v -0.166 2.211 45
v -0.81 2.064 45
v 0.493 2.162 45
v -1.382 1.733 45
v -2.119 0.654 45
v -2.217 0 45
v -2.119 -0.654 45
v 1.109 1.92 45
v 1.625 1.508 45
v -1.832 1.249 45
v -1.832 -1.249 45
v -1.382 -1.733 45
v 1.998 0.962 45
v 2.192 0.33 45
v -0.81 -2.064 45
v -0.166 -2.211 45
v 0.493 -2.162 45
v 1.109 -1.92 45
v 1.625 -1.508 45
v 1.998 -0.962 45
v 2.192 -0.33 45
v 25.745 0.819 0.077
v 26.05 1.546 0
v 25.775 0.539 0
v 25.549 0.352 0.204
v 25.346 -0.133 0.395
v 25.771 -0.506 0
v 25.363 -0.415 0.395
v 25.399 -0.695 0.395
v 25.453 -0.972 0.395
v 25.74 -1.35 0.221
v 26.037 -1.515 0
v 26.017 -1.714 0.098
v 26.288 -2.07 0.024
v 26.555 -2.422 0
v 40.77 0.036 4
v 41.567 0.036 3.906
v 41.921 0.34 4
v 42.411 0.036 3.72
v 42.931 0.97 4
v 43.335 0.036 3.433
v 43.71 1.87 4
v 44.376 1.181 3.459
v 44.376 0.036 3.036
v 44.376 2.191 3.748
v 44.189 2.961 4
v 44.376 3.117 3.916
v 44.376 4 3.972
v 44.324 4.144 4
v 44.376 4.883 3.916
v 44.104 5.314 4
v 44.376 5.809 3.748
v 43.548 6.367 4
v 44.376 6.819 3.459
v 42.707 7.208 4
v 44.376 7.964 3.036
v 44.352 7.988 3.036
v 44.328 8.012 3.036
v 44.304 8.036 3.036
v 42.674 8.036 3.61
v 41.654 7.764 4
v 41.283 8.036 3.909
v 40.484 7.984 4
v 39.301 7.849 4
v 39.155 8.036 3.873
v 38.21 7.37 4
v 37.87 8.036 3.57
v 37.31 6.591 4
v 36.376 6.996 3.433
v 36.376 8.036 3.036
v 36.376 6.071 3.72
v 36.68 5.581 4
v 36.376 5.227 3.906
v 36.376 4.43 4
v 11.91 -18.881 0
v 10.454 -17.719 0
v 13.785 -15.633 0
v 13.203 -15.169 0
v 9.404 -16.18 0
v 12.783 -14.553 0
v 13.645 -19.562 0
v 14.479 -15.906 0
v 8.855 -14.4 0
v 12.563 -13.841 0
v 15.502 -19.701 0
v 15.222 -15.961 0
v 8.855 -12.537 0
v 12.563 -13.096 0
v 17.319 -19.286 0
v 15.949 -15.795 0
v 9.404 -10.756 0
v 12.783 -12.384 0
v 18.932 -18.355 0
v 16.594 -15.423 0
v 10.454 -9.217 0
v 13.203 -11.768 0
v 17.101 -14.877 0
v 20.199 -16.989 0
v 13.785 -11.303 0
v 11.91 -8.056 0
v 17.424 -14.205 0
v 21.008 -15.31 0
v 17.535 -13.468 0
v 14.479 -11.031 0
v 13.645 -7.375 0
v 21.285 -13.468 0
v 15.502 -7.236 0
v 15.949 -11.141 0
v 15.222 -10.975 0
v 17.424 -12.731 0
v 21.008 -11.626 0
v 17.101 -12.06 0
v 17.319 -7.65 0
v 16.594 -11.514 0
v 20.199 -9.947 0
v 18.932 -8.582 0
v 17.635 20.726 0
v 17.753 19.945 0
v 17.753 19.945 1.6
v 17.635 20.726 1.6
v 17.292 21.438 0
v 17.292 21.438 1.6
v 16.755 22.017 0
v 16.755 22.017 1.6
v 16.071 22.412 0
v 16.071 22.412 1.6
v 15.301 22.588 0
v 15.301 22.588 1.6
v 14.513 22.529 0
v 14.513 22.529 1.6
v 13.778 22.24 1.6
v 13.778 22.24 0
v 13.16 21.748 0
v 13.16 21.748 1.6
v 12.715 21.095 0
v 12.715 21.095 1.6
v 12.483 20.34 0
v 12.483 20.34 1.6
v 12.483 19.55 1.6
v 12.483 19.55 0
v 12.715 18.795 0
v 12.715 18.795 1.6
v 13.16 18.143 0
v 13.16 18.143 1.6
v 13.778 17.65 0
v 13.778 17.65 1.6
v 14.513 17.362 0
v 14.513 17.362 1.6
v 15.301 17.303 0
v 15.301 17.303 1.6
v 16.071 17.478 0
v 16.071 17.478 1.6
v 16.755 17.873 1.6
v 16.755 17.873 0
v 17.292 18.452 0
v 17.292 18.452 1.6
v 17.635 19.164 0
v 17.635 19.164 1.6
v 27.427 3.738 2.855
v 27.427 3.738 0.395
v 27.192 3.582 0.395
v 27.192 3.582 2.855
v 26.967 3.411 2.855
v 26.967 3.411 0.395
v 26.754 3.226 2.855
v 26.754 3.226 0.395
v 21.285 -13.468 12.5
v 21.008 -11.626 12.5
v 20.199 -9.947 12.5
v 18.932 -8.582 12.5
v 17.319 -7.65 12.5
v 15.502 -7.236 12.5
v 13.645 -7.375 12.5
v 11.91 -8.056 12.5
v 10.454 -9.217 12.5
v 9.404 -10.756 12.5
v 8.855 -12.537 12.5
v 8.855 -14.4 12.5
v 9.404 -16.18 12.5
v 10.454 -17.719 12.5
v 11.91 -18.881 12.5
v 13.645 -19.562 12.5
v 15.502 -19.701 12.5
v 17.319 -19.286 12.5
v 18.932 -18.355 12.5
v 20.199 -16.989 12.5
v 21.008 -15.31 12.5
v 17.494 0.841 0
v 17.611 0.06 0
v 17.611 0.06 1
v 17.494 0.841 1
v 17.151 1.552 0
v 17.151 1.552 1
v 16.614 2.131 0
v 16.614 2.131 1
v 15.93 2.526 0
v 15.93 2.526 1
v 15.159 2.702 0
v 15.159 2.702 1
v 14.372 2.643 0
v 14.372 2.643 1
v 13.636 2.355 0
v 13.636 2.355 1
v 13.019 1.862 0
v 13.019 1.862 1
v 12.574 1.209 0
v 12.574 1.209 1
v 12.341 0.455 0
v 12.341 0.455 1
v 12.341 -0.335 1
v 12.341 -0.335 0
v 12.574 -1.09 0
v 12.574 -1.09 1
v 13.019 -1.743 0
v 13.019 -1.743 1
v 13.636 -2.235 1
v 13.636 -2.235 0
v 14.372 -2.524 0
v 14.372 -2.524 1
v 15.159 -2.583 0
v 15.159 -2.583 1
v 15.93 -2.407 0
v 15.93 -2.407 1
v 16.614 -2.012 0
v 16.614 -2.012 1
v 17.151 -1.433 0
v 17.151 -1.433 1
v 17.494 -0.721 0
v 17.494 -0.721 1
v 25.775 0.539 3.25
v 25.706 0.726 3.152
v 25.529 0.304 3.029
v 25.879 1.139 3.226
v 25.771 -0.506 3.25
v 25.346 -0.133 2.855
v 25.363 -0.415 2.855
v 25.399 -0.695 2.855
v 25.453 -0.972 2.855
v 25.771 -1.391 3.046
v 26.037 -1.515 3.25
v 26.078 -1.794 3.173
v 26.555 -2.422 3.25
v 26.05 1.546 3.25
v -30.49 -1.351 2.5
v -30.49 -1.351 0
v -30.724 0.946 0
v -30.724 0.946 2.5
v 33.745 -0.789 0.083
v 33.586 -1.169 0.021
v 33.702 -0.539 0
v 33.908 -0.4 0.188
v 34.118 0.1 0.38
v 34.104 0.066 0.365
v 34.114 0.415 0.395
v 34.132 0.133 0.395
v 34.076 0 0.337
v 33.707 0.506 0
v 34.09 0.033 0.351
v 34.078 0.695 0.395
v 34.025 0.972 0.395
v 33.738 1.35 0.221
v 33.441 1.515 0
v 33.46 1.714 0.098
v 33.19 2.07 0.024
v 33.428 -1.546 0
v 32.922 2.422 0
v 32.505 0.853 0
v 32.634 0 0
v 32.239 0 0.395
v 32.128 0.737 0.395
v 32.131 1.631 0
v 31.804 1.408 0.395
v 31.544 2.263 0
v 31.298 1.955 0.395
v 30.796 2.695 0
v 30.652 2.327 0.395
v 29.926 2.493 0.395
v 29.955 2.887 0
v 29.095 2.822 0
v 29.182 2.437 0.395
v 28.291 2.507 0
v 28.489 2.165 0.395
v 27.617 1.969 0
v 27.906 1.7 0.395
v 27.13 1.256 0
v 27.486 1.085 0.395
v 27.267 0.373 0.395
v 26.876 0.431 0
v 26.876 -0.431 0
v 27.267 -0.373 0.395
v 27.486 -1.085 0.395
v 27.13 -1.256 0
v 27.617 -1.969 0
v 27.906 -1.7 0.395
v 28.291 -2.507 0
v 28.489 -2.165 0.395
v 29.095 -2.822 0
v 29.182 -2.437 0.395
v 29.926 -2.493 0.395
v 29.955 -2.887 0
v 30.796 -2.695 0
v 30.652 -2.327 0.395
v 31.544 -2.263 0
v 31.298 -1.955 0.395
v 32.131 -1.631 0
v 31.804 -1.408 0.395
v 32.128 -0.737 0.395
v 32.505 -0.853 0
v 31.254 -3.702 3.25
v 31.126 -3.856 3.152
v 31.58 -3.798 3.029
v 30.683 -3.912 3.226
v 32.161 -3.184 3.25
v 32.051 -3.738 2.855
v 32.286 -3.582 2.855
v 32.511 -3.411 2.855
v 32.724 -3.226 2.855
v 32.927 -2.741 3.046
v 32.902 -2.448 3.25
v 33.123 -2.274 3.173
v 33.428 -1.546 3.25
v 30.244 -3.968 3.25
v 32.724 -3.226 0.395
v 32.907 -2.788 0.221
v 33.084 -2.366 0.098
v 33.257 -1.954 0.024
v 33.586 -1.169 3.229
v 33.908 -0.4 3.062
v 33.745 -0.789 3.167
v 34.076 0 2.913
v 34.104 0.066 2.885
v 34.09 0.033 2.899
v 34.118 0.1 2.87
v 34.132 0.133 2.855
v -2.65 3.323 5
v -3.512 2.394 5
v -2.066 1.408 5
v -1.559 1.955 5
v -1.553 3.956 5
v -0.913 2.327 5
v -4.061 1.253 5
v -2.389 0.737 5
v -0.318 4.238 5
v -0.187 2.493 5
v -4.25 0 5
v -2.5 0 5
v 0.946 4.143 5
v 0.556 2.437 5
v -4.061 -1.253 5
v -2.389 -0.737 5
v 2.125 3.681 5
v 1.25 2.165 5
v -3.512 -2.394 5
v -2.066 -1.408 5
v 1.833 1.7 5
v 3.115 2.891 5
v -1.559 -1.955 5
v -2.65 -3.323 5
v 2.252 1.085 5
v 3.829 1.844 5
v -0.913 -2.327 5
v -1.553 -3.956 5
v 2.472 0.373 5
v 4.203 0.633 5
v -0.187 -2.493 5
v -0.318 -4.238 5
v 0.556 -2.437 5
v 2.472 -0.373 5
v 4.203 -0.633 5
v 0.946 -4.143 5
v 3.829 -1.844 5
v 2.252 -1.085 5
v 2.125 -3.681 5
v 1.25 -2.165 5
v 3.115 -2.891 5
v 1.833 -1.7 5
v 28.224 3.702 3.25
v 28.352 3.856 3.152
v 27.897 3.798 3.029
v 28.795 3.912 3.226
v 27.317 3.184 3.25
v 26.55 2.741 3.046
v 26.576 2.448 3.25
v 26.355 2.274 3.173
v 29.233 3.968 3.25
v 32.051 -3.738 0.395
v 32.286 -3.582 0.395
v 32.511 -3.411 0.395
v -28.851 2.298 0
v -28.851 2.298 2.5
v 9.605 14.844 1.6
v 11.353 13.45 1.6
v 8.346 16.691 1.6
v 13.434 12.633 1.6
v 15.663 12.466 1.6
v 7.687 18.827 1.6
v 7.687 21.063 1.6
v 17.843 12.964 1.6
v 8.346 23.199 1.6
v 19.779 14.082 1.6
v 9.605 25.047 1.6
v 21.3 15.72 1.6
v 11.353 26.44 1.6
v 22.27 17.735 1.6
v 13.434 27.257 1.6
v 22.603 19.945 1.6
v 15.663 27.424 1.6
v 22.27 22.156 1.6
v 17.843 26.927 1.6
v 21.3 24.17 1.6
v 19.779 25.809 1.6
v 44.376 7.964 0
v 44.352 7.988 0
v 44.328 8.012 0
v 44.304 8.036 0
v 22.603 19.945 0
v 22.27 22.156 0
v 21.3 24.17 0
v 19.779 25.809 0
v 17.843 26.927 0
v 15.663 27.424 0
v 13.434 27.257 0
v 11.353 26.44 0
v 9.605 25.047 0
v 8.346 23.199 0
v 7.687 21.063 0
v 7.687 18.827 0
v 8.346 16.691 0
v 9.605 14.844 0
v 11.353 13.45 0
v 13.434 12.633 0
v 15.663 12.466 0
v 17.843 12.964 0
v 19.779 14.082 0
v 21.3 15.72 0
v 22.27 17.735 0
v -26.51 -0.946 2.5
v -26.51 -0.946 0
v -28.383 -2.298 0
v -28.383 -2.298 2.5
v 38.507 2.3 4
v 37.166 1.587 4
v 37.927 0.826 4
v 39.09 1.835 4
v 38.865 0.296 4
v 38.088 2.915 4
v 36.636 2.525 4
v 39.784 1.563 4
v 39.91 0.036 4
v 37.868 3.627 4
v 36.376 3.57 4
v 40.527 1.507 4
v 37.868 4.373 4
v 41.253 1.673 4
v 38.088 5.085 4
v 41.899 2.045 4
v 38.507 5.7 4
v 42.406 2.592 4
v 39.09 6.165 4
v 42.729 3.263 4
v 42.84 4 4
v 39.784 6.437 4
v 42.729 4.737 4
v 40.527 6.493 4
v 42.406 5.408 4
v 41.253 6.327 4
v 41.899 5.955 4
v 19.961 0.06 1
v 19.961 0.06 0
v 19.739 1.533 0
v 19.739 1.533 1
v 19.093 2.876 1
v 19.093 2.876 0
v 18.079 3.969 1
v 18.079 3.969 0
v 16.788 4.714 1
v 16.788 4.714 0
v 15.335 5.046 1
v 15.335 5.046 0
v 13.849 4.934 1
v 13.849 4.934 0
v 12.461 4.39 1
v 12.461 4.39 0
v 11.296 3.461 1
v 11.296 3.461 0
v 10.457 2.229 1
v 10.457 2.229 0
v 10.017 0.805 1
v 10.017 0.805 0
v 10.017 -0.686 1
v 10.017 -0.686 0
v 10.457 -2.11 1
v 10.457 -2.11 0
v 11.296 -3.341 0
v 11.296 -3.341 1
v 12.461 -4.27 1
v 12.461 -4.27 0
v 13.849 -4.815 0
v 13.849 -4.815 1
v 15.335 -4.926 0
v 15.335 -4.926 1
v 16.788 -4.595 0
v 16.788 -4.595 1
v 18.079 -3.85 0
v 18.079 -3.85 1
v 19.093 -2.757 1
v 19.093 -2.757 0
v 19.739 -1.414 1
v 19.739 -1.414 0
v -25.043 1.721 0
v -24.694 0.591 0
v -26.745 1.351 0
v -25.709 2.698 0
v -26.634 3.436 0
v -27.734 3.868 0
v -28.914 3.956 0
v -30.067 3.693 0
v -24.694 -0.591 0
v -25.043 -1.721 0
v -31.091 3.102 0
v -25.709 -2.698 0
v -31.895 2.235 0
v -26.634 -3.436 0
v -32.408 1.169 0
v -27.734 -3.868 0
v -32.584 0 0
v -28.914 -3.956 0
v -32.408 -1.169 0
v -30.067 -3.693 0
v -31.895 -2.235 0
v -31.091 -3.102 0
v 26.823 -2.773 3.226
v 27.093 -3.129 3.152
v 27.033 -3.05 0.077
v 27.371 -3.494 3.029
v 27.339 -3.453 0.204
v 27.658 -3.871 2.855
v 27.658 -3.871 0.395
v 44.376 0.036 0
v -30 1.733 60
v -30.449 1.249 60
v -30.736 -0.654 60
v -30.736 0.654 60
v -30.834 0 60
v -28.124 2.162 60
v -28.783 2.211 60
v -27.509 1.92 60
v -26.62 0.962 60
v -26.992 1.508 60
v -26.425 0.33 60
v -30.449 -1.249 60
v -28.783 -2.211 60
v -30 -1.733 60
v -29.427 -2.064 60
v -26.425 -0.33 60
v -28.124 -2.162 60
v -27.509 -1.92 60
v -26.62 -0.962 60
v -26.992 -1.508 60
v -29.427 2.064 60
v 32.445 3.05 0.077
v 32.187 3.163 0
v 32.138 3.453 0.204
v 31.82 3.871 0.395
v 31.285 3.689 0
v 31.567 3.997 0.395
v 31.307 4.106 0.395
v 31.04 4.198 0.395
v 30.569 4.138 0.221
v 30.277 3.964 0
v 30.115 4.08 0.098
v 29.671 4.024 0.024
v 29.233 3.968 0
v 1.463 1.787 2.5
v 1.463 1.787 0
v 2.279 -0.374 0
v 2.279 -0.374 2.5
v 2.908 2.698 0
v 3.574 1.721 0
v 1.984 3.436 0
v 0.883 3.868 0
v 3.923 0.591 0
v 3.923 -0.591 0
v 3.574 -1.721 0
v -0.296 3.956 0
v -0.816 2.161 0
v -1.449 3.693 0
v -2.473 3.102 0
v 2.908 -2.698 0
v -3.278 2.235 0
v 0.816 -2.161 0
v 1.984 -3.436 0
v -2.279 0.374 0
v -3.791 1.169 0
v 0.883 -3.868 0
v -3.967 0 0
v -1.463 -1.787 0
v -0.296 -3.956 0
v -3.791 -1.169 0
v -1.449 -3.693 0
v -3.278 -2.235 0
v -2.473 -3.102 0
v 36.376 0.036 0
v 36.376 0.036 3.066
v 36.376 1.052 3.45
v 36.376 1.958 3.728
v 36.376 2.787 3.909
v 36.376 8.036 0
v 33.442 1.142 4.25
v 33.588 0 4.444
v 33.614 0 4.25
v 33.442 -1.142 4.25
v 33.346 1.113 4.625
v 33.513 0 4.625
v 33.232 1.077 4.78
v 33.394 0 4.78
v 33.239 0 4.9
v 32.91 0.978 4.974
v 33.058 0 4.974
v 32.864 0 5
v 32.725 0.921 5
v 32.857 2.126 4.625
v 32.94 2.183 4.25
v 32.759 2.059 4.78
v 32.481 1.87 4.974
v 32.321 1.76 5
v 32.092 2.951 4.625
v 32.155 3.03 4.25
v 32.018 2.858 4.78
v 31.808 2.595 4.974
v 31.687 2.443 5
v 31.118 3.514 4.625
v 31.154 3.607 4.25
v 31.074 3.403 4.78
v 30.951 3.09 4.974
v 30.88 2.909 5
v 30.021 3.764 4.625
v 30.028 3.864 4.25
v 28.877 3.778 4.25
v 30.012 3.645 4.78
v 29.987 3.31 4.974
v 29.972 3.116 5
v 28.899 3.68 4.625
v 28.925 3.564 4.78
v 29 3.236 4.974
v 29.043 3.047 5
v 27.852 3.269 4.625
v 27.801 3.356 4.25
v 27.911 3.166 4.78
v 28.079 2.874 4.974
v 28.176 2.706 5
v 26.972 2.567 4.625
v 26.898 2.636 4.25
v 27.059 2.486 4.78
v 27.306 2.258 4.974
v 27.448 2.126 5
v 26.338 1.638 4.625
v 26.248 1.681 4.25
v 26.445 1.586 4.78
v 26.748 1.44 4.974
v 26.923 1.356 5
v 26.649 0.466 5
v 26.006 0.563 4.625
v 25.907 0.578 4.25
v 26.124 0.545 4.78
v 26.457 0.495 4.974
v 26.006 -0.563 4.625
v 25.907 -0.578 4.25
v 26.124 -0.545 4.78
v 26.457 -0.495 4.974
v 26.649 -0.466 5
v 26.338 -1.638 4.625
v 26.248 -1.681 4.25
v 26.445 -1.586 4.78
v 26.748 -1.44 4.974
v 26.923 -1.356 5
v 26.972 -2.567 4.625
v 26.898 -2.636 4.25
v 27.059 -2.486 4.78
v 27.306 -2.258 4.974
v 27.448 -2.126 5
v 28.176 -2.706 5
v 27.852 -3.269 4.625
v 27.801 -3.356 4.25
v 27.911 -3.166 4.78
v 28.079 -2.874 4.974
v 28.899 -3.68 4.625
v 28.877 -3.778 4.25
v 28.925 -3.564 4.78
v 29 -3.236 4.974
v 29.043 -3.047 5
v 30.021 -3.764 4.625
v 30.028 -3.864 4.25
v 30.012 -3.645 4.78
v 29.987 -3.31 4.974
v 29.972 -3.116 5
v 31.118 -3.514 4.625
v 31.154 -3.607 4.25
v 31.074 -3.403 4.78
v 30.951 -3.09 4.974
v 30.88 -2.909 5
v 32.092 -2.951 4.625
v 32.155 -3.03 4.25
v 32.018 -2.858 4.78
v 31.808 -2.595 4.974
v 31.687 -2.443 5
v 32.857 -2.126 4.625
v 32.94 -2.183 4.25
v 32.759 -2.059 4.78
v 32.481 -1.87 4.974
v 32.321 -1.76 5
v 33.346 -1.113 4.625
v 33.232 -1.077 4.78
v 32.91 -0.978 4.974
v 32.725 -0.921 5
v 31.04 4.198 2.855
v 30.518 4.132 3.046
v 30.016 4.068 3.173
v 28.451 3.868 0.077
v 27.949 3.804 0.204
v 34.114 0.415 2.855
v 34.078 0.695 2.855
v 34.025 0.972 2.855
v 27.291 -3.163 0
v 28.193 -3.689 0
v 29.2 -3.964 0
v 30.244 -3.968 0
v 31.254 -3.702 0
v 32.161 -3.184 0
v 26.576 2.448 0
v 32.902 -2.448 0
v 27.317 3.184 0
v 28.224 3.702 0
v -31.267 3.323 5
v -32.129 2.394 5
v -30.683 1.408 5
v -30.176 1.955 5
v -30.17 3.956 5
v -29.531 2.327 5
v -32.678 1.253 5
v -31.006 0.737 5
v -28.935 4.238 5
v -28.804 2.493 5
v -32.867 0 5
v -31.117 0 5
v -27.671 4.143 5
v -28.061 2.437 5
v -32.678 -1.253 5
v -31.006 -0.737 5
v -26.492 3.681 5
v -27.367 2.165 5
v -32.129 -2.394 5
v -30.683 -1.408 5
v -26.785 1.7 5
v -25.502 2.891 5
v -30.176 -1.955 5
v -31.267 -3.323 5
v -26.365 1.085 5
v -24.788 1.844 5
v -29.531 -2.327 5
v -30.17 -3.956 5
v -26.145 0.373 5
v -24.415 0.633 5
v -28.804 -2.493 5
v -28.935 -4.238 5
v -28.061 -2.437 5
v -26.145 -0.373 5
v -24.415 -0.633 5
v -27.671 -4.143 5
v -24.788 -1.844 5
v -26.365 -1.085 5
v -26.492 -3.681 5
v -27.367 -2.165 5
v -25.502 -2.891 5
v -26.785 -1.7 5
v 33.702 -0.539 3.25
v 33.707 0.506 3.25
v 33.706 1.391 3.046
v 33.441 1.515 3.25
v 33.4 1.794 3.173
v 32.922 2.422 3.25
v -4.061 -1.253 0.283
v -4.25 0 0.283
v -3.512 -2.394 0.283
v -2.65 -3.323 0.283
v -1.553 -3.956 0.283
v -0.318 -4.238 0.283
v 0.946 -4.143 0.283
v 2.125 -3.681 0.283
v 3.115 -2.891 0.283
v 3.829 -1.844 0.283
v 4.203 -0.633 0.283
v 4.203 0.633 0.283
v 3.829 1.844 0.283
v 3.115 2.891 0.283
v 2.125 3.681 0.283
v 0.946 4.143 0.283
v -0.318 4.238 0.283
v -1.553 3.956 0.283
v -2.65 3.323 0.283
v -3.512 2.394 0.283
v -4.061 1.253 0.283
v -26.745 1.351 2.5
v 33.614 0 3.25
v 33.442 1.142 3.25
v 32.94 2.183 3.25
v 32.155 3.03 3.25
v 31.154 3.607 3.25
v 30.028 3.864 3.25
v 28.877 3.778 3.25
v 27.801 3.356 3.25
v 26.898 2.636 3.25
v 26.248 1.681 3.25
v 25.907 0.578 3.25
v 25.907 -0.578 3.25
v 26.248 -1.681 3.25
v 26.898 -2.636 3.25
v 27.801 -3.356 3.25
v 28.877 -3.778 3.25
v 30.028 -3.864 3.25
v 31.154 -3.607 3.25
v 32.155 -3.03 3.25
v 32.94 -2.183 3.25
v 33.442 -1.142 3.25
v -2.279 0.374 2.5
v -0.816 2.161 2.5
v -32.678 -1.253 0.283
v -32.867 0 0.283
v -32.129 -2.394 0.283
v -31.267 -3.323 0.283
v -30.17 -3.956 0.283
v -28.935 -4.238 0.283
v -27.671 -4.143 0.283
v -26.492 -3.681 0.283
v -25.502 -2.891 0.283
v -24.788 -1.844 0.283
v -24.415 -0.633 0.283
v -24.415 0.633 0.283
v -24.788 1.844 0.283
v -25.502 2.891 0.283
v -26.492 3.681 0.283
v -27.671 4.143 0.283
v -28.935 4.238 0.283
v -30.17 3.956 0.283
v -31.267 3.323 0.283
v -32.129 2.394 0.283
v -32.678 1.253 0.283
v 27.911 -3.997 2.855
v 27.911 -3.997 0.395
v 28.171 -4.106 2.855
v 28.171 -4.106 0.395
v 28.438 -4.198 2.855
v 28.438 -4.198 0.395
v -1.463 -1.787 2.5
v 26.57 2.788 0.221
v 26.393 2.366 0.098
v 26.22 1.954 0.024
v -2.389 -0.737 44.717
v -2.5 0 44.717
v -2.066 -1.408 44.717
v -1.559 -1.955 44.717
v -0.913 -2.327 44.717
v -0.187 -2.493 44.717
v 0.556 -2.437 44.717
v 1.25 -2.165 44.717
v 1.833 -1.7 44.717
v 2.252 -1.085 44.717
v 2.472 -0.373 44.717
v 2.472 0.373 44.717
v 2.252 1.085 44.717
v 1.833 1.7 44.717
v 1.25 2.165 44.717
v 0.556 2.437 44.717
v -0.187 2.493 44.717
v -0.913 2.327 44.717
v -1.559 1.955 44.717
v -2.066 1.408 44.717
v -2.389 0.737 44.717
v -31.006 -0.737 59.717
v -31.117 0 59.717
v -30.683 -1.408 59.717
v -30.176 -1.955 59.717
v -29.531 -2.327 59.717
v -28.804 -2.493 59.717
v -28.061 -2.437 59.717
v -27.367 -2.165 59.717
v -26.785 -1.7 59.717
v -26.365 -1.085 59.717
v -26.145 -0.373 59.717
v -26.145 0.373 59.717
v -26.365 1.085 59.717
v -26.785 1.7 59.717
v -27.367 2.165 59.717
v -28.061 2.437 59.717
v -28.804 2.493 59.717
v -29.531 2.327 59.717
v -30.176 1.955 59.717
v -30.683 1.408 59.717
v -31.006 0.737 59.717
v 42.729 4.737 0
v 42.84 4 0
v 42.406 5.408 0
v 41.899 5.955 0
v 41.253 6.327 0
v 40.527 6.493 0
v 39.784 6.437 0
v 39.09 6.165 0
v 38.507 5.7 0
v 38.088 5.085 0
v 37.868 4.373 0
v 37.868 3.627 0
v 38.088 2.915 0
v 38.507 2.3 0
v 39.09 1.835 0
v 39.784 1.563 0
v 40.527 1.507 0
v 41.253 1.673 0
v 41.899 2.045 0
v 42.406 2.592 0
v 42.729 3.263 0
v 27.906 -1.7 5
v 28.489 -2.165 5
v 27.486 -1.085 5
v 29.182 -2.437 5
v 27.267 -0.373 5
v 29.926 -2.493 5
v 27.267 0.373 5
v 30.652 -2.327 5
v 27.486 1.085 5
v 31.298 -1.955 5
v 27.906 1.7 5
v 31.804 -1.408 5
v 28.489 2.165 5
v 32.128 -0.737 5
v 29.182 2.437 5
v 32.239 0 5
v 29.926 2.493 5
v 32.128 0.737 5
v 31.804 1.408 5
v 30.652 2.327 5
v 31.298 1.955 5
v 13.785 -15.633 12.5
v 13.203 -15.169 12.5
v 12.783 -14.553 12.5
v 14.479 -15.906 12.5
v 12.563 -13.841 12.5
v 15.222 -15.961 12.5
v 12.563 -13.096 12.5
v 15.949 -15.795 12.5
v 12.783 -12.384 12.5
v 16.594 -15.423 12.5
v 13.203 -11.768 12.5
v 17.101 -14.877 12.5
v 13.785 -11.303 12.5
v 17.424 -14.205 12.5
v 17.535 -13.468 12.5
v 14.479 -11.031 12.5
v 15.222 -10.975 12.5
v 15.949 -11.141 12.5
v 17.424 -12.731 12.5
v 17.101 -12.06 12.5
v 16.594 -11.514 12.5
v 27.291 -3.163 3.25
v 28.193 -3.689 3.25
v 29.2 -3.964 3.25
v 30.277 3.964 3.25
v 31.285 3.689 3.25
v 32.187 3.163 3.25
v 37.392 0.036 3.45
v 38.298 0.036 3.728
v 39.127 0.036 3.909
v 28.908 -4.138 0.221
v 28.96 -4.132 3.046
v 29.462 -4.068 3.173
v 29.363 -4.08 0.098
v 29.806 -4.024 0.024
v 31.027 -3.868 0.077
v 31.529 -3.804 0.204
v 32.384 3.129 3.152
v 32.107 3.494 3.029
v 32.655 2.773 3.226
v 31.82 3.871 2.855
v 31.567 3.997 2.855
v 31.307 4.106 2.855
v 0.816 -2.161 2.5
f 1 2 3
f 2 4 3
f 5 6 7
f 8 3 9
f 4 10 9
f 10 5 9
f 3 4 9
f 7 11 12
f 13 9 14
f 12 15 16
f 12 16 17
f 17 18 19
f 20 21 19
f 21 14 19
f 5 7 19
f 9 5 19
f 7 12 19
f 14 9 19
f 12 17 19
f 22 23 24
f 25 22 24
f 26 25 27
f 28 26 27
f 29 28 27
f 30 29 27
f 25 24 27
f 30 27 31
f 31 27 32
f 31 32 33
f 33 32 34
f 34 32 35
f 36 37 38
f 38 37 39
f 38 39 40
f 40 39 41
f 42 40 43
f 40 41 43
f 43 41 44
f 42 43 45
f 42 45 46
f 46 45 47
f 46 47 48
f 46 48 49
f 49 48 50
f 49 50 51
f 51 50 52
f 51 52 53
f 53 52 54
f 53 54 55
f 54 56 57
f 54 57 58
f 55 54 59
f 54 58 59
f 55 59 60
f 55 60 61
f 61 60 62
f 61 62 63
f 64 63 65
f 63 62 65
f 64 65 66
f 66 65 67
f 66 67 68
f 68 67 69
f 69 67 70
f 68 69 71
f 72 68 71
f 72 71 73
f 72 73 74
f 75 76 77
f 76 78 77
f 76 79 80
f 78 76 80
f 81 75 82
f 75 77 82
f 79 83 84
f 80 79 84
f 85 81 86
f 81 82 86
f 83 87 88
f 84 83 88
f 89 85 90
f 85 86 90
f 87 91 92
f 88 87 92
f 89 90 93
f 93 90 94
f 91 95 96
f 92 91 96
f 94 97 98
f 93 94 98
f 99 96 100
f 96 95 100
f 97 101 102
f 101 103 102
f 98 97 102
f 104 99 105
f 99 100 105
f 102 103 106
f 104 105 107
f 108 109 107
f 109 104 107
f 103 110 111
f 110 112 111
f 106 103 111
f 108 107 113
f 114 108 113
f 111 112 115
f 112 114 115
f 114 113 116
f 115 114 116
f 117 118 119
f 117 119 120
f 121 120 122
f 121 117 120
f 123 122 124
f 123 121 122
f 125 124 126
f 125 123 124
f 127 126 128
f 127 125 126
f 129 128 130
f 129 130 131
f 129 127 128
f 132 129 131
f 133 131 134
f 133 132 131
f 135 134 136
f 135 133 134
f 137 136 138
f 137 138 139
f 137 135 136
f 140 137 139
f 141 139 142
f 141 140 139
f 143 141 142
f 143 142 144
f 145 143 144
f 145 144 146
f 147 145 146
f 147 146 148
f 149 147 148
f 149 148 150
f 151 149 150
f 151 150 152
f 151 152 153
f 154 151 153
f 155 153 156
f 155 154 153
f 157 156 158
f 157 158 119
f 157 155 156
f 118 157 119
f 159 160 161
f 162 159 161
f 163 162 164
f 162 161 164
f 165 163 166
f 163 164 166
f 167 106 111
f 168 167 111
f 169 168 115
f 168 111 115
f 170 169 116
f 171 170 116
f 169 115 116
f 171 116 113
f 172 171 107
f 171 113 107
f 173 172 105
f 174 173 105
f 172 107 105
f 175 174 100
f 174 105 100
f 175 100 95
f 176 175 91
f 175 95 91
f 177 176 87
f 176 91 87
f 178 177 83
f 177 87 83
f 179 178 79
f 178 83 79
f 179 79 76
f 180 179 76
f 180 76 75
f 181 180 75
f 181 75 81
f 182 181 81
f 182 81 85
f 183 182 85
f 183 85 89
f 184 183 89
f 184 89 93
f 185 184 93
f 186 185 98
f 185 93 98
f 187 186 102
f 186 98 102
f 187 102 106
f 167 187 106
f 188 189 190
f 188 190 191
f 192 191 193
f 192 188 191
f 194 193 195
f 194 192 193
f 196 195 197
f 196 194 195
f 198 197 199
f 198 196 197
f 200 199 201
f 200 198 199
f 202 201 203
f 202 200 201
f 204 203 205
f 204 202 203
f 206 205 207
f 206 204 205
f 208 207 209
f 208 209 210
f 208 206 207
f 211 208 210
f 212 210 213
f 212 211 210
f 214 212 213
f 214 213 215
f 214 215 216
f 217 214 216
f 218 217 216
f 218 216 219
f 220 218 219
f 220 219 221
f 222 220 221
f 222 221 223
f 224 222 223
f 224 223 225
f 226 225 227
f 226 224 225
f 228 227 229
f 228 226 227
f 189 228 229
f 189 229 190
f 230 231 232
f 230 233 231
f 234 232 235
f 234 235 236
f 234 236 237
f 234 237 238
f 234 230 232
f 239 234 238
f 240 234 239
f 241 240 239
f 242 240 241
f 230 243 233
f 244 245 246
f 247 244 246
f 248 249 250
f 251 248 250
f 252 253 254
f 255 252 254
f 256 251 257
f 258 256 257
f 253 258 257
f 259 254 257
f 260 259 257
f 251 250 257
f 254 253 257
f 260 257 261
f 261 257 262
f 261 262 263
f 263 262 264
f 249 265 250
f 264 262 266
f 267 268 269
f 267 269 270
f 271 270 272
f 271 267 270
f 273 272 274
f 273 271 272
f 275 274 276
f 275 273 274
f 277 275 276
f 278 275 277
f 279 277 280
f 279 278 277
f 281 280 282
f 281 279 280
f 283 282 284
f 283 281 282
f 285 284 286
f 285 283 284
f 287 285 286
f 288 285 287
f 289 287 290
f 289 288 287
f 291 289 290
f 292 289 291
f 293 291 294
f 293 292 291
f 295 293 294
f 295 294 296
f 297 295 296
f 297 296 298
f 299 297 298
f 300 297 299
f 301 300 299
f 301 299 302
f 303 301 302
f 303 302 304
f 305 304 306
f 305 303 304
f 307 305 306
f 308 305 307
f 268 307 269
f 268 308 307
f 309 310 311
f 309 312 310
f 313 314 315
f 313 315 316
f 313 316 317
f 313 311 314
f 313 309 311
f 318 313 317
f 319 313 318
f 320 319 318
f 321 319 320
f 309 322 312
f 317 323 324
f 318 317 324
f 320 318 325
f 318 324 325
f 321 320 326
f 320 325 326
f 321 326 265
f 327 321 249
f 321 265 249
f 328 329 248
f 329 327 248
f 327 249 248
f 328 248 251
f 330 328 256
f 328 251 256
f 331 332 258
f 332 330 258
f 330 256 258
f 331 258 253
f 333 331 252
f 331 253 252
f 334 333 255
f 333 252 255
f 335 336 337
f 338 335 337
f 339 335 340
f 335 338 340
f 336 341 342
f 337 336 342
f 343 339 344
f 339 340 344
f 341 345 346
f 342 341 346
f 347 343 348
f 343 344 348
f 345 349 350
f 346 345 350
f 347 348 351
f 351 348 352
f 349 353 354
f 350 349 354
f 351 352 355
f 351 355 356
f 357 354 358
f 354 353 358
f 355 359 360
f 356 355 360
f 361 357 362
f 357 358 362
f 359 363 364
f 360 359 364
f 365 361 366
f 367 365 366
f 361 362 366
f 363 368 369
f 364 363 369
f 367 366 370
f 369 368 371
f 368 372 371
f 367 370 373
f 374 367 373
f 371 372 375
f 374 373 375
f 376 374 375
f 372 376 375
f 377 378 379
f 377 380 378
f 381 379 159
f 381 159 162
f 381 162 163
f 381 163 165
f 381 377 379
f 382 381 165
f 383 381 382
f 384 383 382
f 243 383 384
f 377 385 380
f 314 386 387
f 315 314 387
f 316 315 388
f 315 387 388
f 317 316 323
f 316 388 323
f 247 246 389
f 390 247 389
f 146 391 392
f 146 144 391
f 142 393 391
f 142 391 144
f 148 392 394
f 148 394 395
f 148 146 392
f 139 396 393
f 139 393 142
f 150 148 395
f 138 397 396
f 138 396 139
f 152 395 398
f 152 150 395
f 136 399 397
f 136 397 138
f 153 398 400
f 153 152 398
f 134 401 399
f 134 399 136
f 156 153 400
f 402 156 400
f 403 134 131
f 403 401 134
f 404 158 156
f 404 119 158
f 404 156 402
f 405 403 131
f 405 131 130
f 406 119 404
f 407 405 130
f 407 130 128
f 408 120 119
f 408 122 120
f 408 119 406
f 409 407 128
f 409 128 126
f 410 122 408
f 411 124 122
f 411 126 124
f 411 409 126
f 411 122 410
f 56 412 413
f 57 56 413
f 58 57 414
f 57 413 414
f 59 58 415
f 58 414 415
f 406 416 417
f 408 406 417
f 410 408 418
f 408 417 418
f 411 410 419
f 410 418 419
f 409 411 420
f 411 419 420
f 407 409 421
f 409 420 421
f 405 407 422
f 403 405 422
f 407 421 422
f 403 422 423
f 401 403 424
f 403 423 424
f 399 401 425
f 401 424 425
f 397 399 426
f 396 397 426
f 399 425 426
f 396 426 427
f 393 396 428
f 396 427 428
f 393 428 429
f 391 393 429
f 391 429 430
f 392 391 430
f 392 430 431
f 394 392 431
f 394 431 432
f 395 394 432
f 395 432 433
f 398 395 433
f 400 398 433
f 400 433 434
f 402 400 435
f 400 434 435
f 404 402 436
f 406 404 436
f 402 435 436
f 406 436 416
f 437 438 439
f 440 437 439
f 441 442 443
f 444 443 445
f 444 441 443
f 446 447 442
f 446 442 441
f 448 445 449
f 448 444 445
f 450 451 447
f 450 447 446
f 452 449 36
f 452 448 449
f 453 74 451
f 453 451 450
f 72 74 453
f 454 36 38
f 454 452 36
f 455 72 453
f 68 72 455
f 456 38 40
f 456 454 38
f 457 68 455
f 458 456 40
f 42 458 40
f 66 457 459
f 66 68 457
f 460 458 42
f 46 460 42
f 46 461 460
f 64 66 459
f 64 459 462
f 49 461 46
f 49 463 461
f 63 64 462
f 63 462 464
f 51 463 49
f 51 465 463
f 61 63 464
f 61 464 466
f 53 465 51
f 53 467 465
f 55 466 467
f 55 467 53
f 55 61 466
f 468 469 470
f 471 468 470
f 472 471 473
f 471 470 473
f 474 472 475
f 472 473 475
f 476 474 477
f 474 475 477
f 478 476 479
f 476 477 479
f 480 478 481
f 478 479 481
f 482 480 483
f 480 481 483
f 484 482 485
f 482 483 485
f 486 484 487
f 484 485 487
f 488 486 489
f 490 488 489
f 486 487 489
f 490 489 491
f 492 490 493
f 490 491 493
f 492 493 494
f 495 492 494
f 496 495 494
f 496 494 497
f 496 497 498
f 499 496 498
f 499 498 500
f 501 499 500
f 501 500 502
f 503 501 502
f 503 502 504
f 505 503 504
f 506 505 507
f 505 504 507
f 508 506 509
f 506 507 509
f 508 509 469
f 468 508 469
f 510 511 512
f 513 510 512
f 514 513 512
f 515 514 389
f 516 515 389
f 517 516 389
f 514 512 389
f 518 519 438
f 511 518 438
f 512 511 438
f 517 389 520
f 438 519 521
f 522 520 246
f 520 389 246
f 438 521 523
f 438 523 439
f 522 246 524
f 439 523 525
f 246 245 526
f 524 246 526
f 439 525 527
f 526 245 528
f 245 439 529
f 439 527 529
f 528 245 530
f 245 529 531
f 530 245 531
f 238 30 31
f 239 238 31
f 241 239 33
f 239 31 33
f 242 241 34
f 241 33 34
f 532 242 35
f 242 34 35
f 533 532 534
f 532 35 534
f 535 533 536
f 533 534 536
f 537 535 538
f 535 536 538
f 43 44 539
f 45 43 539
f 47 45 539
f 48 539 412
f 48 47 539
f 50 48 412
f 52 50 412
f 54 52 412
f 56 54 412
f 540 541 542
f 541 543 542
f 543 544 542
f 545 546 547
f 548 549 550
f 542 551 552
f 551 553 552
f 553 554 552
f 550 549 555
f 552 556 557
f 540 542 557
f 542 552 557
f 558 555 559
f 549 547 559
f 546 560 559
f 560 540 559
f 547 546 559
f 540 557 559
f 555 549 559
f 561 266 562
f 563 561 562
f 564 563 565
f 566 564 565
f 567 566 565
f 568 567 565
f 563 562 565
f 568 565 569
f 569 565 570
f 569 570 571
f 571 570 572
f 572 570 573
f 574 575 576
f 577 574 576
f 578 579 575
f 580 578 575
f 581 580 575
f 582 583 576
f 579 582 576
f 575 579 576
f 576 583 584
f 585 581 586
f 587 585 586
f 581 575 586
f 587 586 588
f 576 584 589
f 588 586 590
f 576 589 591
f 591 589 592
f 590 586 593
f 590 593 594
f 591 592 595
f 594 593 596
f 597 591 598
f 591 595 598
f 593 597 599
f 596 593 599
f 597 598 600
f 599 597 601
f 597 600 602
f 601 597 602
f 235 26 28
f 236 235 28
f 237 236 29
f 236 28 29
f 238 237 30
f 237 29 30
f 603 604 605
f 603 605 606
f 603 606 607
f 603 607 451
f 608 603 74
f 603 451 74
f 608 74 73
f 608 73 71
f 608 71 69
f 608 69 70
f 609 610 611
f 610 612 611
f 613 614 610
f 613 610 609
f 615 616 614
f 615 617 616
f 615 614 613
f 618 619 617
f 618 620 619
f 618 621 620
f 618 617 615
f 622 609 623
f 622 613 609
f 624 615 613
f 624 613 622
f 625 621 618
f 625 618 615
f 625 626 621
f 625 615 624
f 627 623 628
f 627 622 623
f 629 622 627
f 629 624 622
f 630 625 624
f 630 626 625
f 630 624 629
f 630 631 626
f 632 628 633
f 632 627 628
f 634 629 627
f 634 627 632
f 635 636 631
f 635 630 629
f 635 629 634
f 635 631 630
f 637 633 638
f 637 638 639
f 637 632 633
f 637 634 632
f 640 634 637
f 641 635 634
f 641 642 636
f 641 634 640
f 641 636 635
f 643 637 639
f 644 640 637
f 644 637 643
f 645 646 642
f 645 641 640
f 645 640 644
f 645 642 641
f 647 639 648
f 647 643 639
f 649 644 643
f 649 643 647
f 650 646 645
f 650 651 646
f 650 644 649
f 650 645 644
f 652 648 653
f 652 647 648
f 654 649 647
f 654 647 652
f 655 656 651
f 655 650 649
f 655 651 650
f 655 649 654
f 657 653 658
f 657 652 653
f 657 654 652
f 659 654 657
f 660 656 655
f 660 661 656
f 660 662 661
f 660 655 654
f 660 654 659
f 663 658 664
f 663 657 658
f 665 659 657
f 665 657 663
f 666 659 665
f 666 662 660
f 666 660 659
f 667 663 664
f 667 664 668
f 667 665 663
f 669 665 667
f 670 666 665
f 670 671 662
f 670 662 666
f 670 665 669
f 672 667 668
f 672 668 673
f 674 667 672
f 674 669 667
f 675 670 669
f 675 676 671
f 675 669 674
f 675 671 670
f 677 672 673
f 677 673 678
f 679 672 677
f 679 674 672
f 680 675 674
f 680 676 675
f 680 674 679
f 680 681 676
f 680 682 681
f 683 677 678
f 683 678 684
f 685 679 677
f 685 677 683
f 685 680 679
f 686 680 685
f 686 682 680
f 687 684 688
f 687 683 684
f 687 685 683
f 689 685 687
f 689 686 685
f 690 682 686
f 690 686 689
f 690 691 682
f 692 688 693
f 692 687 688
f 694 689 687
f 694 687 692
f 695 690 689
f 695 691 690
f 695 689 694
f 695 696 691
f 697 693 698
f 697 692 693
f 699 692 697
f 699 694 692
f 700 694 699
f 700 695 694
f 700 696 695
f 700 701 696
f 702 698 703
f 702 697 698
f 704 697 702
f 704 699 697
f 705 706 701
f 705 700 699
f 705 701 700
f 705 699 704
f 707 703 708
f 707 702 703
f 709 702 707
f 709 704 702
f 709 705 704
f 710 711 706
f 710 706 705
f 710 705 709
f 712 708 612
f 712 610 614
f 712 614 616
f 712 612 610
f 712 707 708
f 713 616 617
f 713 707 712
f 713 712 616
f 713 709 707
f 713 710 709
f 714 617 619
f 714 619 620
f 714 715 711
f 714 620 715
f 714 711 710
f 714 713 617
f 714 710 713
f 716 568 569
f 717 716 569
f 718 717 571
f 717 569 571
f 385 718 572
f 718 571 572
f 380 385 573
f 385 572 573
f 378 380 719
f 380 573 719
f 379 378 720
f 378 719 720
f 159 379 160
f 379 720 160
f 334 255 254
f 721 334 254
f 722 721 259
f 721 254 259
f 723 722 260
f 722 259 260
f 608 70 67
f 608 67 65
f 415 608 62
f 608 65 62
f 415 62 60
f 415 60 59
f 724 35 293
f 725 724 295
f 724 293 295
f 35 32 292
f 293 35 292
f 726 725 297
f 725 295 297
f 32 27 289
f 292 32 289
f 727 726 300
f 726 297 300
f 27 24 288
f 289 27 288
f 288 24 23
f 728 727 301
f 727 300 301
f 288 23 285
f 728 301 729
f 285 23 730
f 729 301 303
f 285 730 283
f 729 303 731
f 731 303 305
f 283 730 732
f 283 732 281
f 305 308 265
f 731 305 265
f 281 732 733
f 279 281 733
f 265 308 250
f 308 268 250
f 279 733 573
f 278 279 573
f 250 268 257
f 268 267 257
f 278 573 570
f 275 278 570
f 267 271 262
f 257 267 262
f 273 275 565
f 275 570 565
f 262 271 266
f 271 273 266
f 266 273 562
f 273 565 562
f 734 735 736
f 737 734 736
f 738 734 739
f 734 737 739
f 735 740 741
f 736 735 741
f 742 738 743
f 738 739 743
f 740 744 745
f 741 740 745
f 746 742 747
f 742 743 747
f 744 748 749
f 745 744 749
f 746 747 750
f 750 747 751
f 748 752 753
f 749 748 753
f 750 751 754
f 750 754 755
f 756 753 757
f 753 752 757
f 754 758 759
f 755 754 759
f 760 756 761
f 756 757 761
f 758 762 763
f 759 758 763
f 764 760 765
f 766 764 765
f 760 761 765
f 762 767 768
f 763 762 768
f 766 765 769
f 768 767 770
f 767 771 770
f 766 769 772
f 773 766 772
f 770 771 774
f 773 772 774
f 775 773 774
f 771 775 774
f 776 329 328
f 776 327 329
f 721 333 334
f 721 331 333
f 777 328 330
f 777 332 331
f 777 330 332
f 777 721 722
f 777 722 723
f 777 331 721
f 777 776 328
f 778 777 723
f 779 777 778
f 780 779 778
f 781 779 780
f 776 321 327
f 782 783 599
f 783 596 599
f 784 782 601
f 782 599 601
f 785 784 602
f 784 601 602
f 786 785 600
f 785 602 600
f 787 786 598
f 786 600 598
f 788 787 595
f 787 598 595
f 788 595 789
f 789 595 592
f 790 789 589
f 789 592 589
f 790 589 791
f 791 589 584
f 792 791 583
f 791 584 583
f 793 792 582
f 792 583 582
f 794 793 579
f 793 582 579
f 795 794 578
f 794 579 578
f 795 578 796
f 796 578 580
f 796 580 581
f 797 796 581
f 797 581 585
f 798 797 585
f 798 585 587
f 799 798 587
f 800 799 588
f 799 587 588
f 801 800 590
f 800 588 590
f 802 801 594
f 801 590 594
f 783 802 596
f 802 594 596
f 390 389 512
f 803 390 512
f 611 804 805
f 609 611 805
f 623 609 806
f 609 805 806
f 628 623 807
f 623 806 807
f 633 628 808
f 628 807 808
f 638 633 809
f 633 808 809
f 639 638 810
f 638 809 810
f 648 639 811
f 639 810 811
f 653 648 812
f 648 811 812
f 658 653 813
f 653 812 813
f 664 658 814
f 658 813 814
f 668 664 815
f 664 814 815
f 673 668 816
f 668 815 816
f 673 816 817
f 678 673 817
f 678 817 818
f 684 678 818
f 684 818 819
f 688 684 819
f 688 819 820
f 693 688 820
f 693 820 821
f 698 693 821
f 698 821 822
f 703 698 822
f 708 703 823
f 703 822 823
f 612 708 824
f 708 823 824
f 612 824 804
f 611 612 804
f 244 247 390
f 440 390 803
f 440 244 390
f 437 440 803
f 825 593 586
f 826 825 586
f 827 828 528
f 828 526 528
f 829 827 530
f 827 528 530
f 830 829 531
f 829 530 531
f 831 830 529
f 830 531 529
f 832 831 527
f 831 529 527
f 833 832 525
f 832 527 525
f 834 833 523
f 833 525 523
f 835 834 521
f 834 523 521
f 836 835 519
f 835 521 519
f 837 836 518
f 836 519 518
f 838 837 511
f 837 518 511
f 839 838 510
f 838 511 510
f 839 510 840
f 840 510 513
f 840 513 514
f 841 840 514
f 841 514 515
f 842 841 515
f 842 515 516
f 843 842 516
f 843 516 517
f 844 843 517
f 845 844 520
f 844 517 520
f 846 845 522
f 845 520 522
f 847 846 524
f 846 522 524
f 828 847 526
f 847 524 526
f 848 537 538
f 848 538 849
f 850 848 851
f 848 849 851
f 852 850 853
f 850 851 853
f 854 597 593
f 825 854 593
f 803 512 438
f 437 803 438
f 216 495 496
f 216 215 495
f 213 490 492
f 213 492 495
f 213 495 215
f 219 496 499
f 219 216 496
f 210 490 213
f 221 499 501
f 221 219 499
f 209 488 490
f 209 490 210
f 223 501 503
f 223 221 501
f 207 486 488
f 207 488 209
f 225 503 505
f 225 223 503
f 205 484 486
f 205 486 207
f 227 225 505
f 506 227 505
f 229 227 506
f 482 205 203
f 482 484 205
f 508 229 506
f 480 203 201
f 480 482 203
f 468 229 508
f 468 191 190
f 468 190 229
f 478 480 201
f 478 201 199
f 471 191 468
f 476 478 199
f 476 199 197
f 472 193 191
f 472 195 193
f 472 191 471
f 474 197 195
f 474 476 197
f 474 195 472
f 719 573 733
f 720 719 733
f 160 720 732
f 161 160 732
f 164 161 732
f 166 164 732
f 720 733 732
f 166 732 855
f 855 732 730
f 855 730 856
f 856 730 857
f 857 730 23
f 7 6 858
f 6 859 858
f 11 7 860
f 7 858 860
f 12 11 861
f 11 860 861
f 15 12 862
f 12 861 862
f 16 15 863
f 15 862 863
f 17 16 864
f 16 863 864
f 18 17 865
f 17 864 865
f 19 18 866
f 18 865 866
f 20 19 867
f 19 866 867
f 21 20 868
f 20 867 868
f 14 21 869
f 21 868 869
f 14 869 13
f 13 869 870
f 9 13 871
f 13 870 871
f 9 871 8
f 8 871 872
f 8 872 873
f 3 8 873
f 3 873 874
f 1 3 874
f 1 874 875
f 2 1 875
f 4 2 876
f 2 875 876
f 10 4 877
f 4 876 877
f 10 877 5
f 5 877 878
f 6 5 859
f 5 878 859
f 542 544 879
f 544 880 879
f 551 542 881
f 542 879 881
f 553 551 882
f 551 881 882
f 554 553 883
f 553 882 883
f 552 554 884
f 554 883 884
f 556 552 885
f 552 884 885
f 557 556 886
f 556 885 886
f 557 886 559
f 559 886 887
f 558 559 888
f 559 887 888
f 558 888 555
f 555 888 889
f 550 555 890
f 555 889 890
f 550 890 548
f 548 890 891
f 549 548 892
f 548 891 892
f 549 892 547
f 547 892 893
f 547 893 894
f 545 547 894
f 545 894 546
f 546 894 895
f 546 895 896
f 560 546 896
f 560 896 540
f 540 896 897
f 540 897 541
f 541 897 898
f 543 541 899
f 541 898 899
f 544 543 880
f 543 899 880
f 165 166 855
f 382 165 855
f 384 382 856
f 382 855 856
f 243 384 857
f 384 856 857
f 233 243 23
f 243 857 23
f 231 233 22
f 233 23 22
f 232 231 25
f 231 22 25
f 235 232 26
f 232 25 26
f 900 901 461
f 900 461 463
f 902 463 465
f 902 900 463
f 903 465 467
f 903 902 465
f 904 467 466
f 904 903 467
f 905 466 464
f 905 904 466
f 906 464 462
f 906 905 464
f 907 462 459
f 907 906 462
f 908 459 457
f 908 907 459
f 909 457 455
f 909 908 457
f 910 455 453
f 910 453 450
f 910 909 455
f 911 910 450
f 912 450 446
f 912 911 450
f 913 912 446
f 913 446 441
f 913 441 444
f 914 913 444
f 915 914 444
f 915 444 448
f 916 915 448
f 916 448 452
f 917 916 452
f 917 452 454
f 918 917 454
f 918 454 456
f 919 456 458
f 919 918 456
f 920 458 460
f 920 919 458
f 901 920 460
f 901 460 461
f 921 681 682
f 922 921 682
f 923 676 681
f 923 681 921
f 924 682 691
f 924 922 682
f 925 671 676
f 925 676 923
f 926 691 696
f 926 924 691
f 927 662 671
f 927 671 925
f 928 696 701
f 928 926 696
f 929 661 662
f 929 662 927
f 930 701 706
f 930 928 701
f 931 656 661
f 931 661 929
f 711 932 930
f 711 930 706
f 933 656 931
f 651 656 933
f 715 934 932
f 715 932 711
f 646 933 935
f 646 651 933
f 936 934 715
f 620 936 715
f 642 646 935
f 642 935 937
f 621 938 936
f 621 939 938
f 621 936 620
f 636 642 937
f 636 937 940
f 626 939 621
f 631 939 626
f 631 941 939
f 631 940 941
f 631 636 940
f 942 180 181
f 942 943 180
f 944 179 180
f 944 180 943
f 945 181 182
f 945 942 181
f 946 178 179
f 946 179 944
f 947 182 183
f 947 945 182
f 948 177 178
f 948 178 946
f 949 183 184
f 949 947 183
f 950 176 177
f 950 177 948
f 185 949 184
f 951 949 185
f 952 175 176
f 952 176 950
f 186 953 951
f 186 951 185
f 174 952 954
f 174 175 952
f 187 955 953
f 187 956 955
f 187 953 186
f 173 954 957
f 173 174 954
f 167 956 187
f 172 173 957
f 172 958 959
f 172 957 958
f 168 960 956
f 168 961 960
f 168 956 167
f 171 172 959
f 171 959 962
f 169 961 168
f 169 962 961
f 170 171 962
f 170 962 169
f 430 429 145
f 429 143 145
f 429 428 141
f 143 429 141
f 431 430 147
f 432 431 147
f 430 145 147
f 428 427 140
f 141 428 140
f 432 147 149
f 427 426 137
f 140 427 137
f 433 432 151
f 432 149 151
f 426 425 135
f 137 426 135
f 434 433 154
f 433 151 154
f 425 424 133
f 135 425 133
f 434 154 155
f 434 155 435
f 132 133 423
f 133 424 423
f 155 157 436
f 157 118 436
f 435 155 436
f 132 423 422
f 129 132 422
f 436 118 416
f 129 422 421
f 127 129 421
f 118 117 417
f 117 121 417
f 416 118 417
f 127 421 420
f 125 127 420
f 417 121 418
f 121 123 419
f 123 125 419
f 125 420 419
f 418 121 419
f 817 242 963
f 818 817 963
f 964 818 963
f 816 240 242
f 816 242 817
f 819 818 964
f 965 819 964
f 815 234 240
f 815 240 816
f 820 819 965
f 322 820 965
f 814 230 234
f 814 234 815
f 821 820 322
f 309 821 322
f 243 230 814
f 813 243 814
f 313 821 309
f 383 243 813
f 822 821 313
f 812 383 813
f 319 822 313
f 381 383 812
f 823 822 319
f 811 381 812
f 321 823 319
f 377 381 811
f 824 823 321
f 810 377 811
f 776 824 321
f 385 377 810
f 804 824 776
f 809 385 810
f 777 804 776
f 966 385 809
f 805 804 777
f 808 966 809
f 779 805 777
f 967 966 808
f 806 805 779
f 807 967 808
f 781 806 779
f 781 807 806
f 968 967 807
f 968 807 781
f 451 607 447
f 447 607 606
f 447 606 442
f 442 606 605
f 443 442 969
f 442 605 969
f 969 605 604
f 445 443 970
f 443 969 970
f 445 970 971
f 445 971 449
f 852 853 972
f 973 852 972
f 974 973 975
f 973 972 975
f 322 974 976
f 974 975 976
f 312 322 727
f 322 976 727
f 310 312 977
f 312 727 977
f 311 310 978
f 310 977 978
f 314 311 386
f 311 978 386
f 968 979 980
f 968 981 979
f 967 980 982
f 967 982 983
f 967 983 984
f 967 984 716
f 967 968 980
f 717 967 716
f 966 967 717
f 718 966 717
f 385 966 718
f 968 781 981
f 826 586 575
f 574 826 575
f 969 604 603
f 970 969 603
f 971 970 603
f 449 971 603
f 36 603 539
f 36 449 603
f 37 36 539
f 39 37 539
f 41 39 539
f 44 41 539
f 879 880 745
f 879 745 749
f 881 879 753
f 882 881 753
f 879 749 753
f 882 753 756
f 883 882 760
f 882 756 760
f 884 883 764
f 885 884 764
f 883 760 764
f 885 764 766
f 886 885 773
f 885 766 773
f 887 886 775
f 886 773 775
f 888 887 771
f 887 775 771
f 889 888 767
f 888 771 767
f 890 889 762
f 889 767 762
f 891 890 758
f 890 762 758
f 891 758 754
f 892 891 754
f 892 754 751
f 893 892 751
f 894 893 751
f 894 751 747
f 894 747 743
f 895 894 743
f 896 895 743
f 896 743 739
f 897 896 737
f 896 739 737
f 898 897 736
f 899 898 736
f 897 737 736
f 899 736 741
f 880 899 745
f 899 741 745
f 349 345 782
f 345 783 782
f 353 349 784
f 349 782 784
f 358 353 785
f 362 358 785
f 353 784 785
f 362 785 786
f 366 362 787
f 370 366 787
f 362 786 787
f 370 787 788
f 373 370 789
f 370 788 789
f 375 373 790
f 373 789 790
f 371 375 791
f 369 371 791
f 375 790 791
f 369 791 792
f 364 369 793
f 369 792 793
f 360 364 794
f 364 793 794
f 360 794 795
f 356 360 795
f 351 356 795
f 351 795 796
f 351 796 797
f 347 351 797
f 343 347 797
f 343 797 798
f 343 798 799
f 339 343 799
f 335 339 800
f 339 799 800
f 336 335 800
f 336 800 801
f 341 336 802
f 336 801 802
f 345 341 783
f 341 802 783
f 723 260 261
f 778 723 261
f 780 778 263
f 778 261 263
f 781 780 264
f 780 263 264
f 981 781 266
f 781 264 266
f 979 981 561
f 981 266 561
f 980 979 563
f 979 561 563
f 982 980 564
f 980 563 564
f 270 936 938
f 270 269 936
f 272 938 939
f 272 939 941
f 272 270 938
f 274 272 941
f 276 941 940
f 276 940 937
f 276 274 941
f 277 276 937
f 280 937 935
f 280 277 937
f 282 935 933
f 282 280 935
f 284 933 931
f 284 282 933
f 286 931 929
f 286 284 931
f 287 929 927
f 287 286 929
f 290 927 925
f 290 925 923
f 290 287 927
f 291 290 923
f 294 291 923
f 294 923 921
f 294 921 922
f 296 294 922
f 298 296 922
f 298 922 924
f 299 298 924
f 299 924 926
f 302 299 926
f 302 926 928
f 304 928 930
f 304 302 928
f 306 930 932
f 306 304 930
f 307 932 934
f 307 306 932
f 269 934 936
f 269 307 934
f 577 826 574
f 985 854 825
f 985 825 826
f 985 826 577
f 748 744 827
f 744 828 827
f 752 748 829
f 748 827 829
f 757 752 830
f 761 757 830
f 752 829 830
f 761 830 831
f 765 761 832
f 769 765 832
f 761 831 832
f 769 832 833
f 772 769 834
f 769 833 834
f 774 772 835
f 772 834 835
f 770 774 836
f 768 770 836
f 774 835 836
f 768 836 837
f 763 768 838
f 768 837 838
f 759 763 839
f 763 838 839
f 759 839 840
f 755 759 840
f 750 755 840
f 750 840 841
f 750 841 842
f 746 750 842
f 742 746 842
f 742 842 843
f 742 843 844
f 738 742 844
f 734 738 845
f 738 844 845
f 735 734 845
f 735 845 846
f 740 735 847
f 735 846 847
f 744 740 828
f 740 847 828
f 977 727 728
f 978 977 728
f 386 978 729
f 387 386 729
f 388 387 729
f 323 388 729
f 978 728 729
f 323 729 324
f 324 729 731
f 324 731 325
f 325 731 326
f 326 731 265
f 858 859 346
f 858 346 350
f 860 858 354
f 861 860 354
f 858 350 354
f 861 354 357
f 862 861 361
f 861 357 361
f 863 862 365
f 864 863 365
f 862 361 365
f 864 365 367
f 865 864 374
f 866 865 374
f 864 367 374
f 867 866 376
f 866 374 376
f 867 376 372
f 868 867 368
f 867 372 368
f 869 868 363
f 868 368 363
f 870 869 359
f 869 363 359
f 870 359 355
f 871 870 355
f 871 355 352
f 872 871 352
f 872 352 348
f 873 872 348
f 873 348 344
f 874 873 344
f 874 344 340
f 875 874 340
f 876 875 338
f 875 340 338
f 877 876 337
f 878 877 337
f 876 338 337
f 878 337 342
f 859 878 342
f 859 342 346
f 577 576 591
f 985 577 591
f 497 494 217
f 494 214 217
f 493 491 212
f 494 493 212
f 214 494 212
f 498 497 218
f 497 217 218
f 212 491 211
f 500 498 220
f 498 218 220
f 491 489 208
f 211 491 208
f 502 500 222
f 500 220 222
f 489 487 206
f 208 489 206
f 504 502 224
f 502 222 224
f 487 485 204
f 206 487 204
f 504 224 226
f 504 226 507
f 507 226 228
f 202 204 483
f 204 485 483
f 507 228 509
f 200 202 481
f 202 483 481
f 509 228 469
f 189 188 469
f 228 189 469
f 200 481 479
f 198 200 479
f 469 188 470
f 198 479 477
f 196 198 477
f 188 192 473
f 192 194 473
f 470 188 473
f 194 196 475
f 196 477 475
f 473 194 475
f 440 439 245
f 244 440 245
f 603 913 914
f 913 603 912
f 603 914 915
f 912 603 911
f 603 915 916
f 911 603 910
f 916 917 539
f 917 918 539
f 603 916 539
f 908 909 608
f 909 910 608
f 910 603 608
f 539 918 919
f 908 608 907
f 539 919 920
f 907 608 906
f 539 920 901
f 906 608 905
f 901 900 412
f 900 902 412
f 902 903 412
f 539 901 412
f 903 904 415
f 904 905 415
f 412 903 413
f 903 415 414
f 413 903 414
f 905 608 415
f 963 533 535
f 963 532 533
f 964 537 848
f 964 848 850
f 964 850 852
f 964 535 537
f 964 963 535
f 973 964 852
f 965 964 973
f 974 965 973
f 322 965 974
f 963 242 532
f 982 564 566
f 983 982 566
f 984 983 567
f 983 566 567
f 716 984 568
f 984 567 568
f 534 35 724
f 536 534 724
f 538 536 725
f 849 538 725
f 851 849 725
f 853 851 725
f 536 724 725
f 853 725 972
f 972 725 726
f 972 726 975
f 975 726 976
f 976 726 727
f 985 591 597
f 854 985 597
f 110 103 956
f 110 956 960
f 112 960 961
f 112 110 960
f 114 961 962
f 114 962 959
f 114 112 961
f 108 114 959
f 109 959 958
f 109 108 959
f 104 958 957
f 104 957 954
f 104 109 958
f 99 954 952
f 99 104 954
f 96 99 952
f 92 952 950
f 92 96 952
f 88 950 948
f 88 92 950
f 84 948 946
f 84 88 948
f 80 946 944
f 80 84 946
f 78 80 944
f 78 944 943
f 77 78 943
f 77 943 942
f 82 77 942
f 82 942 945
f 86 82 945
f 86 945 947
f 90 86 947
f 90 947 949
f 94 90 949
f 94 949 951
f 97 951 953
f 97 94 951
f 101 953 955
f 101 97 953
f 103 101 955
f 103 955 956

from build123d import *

# Parameters (mm, degrees)
F3_DEPTH  = 2.5
F4_R      = 5
F4_R_2    = 2.65
F5_DEPTH  = 1
F6_R      = 4.395
F6_R_2    = 2.5
F7_DEPTH  = 3.25
F8_SIZE   = 0.395
F9_R      = 6.6262147002
F10_DEPTH = 25
F11_R     = 3.875
F11_R_2   = 2.5
F12_DEPTH = 1.75
F13_R     = 0.75
F14_R     = 5.6568542495
F14_R_2   = 2.5
F15_DEPTH = 4
F16_SIZE2 = 0.9641749495
F16_SIZE  = 1.67
F17_W     = 15.1353180408
F17_H     = 15.3016392142
F17_W_2   = 7.9996718913
F17_H_2   = 7.9996718913
F18_DEPTH = 4.001
F22_DEPTH = 2.5
F23_R     = 6.25
F23_R_2   = 2.5
F24_DEPTH = 12.5
F25_R     = 7.5
F25_R_2   = 2.65
F26_DEPTH = 1.6


with BuildPart() as f1:
    # F0 (on Front) → F1 (revolve)
    with BuildSketch(Plane.XZ):
        Polygon((-2.5, 5), (-4.25, 5), (-4.25, 0.2828427125), (-3.9671572875, 0), (0, 0), (0, 5), (0, 45), (-2.2171572875, 45), (-2.5, 44.7171572875), align=None)
    revolve(axis=Axis((0, 0, 25), (0, 0, 1)))

    # F2 (on face) → F3 (cut)
    with BuildSketch(Plane(origin=(0, 0, 0), x_dir=(1, 0, 0), z_dir=(0, 0, -1))):
        Polygon((2.2789204629, 0.3739717329), (0.8155912105, 2.1605888805), (-1.4633292524, 1.7866171477), (-2.2789204629, -0.3739717329), (-0.8155912105, -2.1605888805), (1.4633292524, -1.7866171477), align=None)
    extrude(amount=-F3_DEPTH, mode=Mode.SUBTRACT)


with BuildPart() as f5:
    # F4 (on Top) → F5 (new body)
    with BuildSketch(Plane.XY):
        with Locations((14.961370267, 0.0596389182)):
            Circle(F4_R)
        with Locations((14.961370267, 0.0596389182)):
            Circle(F4_R_2, mode=Mode.SUBTRACT)
    extrude(amount=F5_DEPTH)


with BuildPart() as f7:
    # F6 (on Top) → F7 (new body)
    with BuildSketch(Plane.XY):
        with Locations((29.7387912412, 0)):
            Circle(F6_R)
        with Locations((29.7387912412, 0)):
            Circle(F6_R_2, mode=Mode.SUBTRACT)
    extrude(amount=F7_DEPTH)

    # F8
    f8_edges = [f7.edges().sort_by_distance(p)[0] for p in [
        (27.238791, 0, 0),
        (25.343791, 0, 0),
        (25.343791, 0, 3.25),
    ]]
    chamfer(f8_edges, length=F8_SIZE)

    # F9 (on face) → F10 (cut)
    with BuildSketch(Plane(origin=(0, 0, 0), x_dir=(1, 0, 0), z_dir=(0, 0, -1))):
        with Locations((29.7387912412, 0)):
            Circle(F9_R)
        Polygon((26.9423711402, -3.676053312), (25.1570256369, 0.5837441911), (27.9534457378, 4.259797503), (32.5352113421, 3.676053312), (34.3205568454, -0.5837441911), (31.5241367445, -4.259797503), align=None, mode=Mode.SUBTRACT)
    extrude(amount=-F10_DEPTH, mode=Mode.SUBTRACT)

    # F11 (on face) → F12 (join)
    with BuildSketch(Plane.XY.offset(3.25)):
        with Locations((29.7387912412, 0)):
            Circle(F11_R)
        with Locations((29.7387912412, 0)):
            Circle(F11_R_2, mode=Mode.SUBTRACT)
    extrude(amount=F12_DEPTH)

    # F13
    f13_edges = [f7.edges().sort_by_distance(p)[0] for p in [
        (25.863791, 0, 5),
    ]]
    fillet(f13_edges, radius=F13_R)


with BuildPart() as f15:
    # F14 (on Top) → F15 (new body)
    with BuildSketch(Plane.XY):
        with Locations((40.3399839997, 4)):
            Circle(F14_R)
        with Locations((40.3399839997, 4)):
            Circle(F14_R_2, mode=Mode.SUBTRACT)
    extrude(amount=F15_DEPTH)

    # F16
    f16_edges = [f15.edges().sort_by_distance(p)[0] for p in [
        (34.68313, 4, 4),
    ]]
    f16_side = f15.faces().sort_by_distance((34.84313, 4, 4))[0]
    chamfer(f16_edges, length=F16_SIZE, length2=F16_SIZE2, reference=f16_side)

    # F17 (on face) → F18 (cut, through all)
    with BuildSketch(Plane.XY.offset(4)):
        with Locations((41.0747788846, 4.0218560025)):
            Rectangle(F17_W, F17_H)
        with Locations((40.3762111713, 4.0362271715)):
            Rectangle(F17_W_2, F17_H_2, mode=Mode.SUBTRACT)
    extrude(amount=-F18_DEPTH, mode=Mode.SUBTRACT)


with BuildPart() as f20:
    # F19 (on Front) → F20 (revolve)
    with BuildSketch(Plane.XZ):
        Polygon((-31.117204776, 5), (-32.867204776, 5), (-32.867204776, 0.2828427125), (-32.5843620636, 0), (-28.617204776, 0), (-28.617204776, 5), (-28.617204776, 60), (-30.8343620636, 60), (-31.117204776, 59.7171572875), align=None)
    revolve(axis=Axis((-28.617204776, 0, 32.5), (0, 0, 1)))

    # F21 (on face) → F22 (cut)
    with BuildSketch(Plane(origin=(0, 0, 0), x_dir=(1, 0, 0), z_dir=(0, 0, -1))):
        Polygon((-26.510462039, 0.946027681), (-28.3831174119, 2.29750657), (-30.489860149, 1.351478889), (-30.7239475131, -0.946027681), (-28.8512921401, -2.29750657), (-26.7445494031, -1.351478889), align=None)
    extrude(amount=-F22_DEPTH, mode=Mode.SUBTRACT)


with BuildPart() as f24:
    # F23 (on Top) → F24 (new body)
    with BuildSketch(Plane.XY):
        with Locations((15.0353042409, -13.468246907)):
            Circle(F23_R)
        with Locations((15.0353042409, -13.468246907)):
            Circle(F23_R_2, mode=Mode.SUBTRACT)
    extrude(amount=F24_DEPTH)


with BuildPart() as f26:
    # F25 (on Top) → F26 (new body)
    with BuildSketch(Plane.XY):
        with Locations((15.1029657573, 19.9452657253)):
            Circle(F25_R)
        with Locations((15.1029657573, 19.9452657253)):
            Circle(F25_R_2, mode=Mode.SUBTRACT)
    extrude(amount=F26_DEPTH)


solid = Compound([f1.part, f5.part, f7.part, f15.part, f20.part, f24.part, f26.part])
